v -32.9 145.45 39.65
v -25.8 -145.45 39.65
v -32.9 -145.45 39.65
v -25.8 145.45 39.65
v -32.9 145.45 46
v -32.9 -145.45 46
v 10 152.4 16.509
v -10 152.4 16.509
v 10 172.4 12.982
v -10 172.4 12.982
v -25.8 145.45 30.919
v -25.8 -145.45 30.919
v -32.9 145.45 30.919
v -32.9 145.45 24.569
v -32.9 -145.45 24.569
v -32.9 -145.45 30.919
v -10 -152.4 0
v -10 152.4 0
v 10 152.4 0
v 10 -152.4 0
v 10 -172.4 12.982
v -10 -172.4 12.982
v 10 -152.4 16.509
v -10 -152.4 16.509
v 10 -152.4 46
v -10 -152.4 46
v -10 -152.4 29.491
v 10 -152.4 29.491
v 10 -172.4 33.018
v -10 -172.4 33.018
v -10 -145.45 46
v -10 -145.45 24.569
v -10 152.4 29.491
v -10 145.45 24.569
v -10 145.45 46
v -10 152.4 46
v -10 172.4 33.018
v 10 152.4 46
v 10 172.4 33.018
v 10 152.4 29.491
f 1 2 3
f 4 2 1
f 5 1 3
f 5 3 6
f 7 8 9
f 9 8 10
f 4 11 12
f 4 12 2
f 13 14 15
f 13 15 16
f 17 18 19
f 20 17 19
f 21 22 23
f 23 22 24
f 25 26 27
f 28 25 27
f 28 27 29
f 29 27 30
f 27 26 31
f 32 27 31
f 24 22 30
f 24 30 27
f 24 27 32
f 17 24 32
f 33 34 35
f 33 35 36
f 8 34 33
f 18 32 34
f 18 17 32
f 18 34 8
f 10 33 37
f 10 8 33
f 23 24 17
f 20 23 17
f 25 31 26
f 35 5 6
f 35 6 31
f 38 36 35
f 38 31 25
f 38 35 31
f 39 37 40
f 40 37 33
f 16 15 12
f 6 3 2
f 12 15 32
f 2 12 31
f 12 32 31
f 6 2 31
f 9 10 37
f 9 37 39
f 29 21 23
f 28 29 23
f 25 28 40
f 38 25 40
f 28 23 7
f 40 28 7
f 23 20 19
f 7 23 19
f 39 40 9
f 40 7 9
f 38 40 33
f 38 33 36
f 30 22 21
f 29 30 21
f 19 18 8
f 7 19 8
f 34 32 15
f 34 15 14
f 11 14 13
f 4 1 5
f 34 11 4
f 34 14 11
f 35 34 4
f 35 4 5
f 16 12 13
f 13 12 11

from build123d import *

# Parameters (mm, degrees)
SKETCH1_W           = 20
SKETCH1_H           = 344.8
BOSS_EXTRUDE1_DEPTH = 46
SKETCH2_W           = 6.35
SKETCH2_H           = 290.9
BOSS_EXTRUDE2_DEPTH = 22.9
CUT_EXTRUDE1_DEPTH  = 20
SKETCH2_3_W         = 8.73125
SKETCH2_3_H         = 290.9
BOSS_EXTRUDE3_DEPTH = 15.8


with BuildPart() as part:
    # Sketch1 → Boss-Extrude1 (new body)
    with BuildSketch(Plane.XY):
        Rectangle(SKETCH1_W, SKETCH1_H)
    extrude(amount=BOSS_EXTRUDE1_DEPTH)

    # Sketch2 → Boss-Extrude2 (add)
    with BuildSketch(Plane.ZY.offset(10)):
        with Locations((42.825, 0)):
            Rectangle(SKETCH2_W, SKETCH2_H)
        with Locations((27.74375, 0)):
            Rectangle(SKETCH2_W, SKETCH2_H)
    extrude(amount=BOSS_EXTRUDE2_DEPTH)

    # Sketch3 → Cut-Extrude1 (cut)
    with BuildSketch(Plane.ZY.offset(10)):
        Polygon((46, -172.4), (46, -152.4), (29.491, -152.4), (33.0175, -172.4), align=None)
        Polygon((0, 172.4), (0, 152.4), (16.509, 152.4), (12.9825, 172.4), align=None)
        Polygon((12.9825, -172.4), (16.509, -152.4), (0, -152.4), (0, -172.4), align=None)
        Polygon((33.0175, 172.4), (29.491, 152.4), (46, 152.4), (46, 172.4), align=None)
    extrude(amount=-CUT_EXTRUDE1_DEPTH, mode=Mode.SUBTRACT)

    # Sketch2<3> → Boss-Extrude3 (add)
    with BuildSketch(Plane.ZY.offset(10)):
        with Locations((35.284375, 0)):
            Rectangle(SKETCH2_3_W, SKETCH2_3_H)
    extrude(amount=BOSS_EXTRUDE3_DEPTH)


solid = part.part
